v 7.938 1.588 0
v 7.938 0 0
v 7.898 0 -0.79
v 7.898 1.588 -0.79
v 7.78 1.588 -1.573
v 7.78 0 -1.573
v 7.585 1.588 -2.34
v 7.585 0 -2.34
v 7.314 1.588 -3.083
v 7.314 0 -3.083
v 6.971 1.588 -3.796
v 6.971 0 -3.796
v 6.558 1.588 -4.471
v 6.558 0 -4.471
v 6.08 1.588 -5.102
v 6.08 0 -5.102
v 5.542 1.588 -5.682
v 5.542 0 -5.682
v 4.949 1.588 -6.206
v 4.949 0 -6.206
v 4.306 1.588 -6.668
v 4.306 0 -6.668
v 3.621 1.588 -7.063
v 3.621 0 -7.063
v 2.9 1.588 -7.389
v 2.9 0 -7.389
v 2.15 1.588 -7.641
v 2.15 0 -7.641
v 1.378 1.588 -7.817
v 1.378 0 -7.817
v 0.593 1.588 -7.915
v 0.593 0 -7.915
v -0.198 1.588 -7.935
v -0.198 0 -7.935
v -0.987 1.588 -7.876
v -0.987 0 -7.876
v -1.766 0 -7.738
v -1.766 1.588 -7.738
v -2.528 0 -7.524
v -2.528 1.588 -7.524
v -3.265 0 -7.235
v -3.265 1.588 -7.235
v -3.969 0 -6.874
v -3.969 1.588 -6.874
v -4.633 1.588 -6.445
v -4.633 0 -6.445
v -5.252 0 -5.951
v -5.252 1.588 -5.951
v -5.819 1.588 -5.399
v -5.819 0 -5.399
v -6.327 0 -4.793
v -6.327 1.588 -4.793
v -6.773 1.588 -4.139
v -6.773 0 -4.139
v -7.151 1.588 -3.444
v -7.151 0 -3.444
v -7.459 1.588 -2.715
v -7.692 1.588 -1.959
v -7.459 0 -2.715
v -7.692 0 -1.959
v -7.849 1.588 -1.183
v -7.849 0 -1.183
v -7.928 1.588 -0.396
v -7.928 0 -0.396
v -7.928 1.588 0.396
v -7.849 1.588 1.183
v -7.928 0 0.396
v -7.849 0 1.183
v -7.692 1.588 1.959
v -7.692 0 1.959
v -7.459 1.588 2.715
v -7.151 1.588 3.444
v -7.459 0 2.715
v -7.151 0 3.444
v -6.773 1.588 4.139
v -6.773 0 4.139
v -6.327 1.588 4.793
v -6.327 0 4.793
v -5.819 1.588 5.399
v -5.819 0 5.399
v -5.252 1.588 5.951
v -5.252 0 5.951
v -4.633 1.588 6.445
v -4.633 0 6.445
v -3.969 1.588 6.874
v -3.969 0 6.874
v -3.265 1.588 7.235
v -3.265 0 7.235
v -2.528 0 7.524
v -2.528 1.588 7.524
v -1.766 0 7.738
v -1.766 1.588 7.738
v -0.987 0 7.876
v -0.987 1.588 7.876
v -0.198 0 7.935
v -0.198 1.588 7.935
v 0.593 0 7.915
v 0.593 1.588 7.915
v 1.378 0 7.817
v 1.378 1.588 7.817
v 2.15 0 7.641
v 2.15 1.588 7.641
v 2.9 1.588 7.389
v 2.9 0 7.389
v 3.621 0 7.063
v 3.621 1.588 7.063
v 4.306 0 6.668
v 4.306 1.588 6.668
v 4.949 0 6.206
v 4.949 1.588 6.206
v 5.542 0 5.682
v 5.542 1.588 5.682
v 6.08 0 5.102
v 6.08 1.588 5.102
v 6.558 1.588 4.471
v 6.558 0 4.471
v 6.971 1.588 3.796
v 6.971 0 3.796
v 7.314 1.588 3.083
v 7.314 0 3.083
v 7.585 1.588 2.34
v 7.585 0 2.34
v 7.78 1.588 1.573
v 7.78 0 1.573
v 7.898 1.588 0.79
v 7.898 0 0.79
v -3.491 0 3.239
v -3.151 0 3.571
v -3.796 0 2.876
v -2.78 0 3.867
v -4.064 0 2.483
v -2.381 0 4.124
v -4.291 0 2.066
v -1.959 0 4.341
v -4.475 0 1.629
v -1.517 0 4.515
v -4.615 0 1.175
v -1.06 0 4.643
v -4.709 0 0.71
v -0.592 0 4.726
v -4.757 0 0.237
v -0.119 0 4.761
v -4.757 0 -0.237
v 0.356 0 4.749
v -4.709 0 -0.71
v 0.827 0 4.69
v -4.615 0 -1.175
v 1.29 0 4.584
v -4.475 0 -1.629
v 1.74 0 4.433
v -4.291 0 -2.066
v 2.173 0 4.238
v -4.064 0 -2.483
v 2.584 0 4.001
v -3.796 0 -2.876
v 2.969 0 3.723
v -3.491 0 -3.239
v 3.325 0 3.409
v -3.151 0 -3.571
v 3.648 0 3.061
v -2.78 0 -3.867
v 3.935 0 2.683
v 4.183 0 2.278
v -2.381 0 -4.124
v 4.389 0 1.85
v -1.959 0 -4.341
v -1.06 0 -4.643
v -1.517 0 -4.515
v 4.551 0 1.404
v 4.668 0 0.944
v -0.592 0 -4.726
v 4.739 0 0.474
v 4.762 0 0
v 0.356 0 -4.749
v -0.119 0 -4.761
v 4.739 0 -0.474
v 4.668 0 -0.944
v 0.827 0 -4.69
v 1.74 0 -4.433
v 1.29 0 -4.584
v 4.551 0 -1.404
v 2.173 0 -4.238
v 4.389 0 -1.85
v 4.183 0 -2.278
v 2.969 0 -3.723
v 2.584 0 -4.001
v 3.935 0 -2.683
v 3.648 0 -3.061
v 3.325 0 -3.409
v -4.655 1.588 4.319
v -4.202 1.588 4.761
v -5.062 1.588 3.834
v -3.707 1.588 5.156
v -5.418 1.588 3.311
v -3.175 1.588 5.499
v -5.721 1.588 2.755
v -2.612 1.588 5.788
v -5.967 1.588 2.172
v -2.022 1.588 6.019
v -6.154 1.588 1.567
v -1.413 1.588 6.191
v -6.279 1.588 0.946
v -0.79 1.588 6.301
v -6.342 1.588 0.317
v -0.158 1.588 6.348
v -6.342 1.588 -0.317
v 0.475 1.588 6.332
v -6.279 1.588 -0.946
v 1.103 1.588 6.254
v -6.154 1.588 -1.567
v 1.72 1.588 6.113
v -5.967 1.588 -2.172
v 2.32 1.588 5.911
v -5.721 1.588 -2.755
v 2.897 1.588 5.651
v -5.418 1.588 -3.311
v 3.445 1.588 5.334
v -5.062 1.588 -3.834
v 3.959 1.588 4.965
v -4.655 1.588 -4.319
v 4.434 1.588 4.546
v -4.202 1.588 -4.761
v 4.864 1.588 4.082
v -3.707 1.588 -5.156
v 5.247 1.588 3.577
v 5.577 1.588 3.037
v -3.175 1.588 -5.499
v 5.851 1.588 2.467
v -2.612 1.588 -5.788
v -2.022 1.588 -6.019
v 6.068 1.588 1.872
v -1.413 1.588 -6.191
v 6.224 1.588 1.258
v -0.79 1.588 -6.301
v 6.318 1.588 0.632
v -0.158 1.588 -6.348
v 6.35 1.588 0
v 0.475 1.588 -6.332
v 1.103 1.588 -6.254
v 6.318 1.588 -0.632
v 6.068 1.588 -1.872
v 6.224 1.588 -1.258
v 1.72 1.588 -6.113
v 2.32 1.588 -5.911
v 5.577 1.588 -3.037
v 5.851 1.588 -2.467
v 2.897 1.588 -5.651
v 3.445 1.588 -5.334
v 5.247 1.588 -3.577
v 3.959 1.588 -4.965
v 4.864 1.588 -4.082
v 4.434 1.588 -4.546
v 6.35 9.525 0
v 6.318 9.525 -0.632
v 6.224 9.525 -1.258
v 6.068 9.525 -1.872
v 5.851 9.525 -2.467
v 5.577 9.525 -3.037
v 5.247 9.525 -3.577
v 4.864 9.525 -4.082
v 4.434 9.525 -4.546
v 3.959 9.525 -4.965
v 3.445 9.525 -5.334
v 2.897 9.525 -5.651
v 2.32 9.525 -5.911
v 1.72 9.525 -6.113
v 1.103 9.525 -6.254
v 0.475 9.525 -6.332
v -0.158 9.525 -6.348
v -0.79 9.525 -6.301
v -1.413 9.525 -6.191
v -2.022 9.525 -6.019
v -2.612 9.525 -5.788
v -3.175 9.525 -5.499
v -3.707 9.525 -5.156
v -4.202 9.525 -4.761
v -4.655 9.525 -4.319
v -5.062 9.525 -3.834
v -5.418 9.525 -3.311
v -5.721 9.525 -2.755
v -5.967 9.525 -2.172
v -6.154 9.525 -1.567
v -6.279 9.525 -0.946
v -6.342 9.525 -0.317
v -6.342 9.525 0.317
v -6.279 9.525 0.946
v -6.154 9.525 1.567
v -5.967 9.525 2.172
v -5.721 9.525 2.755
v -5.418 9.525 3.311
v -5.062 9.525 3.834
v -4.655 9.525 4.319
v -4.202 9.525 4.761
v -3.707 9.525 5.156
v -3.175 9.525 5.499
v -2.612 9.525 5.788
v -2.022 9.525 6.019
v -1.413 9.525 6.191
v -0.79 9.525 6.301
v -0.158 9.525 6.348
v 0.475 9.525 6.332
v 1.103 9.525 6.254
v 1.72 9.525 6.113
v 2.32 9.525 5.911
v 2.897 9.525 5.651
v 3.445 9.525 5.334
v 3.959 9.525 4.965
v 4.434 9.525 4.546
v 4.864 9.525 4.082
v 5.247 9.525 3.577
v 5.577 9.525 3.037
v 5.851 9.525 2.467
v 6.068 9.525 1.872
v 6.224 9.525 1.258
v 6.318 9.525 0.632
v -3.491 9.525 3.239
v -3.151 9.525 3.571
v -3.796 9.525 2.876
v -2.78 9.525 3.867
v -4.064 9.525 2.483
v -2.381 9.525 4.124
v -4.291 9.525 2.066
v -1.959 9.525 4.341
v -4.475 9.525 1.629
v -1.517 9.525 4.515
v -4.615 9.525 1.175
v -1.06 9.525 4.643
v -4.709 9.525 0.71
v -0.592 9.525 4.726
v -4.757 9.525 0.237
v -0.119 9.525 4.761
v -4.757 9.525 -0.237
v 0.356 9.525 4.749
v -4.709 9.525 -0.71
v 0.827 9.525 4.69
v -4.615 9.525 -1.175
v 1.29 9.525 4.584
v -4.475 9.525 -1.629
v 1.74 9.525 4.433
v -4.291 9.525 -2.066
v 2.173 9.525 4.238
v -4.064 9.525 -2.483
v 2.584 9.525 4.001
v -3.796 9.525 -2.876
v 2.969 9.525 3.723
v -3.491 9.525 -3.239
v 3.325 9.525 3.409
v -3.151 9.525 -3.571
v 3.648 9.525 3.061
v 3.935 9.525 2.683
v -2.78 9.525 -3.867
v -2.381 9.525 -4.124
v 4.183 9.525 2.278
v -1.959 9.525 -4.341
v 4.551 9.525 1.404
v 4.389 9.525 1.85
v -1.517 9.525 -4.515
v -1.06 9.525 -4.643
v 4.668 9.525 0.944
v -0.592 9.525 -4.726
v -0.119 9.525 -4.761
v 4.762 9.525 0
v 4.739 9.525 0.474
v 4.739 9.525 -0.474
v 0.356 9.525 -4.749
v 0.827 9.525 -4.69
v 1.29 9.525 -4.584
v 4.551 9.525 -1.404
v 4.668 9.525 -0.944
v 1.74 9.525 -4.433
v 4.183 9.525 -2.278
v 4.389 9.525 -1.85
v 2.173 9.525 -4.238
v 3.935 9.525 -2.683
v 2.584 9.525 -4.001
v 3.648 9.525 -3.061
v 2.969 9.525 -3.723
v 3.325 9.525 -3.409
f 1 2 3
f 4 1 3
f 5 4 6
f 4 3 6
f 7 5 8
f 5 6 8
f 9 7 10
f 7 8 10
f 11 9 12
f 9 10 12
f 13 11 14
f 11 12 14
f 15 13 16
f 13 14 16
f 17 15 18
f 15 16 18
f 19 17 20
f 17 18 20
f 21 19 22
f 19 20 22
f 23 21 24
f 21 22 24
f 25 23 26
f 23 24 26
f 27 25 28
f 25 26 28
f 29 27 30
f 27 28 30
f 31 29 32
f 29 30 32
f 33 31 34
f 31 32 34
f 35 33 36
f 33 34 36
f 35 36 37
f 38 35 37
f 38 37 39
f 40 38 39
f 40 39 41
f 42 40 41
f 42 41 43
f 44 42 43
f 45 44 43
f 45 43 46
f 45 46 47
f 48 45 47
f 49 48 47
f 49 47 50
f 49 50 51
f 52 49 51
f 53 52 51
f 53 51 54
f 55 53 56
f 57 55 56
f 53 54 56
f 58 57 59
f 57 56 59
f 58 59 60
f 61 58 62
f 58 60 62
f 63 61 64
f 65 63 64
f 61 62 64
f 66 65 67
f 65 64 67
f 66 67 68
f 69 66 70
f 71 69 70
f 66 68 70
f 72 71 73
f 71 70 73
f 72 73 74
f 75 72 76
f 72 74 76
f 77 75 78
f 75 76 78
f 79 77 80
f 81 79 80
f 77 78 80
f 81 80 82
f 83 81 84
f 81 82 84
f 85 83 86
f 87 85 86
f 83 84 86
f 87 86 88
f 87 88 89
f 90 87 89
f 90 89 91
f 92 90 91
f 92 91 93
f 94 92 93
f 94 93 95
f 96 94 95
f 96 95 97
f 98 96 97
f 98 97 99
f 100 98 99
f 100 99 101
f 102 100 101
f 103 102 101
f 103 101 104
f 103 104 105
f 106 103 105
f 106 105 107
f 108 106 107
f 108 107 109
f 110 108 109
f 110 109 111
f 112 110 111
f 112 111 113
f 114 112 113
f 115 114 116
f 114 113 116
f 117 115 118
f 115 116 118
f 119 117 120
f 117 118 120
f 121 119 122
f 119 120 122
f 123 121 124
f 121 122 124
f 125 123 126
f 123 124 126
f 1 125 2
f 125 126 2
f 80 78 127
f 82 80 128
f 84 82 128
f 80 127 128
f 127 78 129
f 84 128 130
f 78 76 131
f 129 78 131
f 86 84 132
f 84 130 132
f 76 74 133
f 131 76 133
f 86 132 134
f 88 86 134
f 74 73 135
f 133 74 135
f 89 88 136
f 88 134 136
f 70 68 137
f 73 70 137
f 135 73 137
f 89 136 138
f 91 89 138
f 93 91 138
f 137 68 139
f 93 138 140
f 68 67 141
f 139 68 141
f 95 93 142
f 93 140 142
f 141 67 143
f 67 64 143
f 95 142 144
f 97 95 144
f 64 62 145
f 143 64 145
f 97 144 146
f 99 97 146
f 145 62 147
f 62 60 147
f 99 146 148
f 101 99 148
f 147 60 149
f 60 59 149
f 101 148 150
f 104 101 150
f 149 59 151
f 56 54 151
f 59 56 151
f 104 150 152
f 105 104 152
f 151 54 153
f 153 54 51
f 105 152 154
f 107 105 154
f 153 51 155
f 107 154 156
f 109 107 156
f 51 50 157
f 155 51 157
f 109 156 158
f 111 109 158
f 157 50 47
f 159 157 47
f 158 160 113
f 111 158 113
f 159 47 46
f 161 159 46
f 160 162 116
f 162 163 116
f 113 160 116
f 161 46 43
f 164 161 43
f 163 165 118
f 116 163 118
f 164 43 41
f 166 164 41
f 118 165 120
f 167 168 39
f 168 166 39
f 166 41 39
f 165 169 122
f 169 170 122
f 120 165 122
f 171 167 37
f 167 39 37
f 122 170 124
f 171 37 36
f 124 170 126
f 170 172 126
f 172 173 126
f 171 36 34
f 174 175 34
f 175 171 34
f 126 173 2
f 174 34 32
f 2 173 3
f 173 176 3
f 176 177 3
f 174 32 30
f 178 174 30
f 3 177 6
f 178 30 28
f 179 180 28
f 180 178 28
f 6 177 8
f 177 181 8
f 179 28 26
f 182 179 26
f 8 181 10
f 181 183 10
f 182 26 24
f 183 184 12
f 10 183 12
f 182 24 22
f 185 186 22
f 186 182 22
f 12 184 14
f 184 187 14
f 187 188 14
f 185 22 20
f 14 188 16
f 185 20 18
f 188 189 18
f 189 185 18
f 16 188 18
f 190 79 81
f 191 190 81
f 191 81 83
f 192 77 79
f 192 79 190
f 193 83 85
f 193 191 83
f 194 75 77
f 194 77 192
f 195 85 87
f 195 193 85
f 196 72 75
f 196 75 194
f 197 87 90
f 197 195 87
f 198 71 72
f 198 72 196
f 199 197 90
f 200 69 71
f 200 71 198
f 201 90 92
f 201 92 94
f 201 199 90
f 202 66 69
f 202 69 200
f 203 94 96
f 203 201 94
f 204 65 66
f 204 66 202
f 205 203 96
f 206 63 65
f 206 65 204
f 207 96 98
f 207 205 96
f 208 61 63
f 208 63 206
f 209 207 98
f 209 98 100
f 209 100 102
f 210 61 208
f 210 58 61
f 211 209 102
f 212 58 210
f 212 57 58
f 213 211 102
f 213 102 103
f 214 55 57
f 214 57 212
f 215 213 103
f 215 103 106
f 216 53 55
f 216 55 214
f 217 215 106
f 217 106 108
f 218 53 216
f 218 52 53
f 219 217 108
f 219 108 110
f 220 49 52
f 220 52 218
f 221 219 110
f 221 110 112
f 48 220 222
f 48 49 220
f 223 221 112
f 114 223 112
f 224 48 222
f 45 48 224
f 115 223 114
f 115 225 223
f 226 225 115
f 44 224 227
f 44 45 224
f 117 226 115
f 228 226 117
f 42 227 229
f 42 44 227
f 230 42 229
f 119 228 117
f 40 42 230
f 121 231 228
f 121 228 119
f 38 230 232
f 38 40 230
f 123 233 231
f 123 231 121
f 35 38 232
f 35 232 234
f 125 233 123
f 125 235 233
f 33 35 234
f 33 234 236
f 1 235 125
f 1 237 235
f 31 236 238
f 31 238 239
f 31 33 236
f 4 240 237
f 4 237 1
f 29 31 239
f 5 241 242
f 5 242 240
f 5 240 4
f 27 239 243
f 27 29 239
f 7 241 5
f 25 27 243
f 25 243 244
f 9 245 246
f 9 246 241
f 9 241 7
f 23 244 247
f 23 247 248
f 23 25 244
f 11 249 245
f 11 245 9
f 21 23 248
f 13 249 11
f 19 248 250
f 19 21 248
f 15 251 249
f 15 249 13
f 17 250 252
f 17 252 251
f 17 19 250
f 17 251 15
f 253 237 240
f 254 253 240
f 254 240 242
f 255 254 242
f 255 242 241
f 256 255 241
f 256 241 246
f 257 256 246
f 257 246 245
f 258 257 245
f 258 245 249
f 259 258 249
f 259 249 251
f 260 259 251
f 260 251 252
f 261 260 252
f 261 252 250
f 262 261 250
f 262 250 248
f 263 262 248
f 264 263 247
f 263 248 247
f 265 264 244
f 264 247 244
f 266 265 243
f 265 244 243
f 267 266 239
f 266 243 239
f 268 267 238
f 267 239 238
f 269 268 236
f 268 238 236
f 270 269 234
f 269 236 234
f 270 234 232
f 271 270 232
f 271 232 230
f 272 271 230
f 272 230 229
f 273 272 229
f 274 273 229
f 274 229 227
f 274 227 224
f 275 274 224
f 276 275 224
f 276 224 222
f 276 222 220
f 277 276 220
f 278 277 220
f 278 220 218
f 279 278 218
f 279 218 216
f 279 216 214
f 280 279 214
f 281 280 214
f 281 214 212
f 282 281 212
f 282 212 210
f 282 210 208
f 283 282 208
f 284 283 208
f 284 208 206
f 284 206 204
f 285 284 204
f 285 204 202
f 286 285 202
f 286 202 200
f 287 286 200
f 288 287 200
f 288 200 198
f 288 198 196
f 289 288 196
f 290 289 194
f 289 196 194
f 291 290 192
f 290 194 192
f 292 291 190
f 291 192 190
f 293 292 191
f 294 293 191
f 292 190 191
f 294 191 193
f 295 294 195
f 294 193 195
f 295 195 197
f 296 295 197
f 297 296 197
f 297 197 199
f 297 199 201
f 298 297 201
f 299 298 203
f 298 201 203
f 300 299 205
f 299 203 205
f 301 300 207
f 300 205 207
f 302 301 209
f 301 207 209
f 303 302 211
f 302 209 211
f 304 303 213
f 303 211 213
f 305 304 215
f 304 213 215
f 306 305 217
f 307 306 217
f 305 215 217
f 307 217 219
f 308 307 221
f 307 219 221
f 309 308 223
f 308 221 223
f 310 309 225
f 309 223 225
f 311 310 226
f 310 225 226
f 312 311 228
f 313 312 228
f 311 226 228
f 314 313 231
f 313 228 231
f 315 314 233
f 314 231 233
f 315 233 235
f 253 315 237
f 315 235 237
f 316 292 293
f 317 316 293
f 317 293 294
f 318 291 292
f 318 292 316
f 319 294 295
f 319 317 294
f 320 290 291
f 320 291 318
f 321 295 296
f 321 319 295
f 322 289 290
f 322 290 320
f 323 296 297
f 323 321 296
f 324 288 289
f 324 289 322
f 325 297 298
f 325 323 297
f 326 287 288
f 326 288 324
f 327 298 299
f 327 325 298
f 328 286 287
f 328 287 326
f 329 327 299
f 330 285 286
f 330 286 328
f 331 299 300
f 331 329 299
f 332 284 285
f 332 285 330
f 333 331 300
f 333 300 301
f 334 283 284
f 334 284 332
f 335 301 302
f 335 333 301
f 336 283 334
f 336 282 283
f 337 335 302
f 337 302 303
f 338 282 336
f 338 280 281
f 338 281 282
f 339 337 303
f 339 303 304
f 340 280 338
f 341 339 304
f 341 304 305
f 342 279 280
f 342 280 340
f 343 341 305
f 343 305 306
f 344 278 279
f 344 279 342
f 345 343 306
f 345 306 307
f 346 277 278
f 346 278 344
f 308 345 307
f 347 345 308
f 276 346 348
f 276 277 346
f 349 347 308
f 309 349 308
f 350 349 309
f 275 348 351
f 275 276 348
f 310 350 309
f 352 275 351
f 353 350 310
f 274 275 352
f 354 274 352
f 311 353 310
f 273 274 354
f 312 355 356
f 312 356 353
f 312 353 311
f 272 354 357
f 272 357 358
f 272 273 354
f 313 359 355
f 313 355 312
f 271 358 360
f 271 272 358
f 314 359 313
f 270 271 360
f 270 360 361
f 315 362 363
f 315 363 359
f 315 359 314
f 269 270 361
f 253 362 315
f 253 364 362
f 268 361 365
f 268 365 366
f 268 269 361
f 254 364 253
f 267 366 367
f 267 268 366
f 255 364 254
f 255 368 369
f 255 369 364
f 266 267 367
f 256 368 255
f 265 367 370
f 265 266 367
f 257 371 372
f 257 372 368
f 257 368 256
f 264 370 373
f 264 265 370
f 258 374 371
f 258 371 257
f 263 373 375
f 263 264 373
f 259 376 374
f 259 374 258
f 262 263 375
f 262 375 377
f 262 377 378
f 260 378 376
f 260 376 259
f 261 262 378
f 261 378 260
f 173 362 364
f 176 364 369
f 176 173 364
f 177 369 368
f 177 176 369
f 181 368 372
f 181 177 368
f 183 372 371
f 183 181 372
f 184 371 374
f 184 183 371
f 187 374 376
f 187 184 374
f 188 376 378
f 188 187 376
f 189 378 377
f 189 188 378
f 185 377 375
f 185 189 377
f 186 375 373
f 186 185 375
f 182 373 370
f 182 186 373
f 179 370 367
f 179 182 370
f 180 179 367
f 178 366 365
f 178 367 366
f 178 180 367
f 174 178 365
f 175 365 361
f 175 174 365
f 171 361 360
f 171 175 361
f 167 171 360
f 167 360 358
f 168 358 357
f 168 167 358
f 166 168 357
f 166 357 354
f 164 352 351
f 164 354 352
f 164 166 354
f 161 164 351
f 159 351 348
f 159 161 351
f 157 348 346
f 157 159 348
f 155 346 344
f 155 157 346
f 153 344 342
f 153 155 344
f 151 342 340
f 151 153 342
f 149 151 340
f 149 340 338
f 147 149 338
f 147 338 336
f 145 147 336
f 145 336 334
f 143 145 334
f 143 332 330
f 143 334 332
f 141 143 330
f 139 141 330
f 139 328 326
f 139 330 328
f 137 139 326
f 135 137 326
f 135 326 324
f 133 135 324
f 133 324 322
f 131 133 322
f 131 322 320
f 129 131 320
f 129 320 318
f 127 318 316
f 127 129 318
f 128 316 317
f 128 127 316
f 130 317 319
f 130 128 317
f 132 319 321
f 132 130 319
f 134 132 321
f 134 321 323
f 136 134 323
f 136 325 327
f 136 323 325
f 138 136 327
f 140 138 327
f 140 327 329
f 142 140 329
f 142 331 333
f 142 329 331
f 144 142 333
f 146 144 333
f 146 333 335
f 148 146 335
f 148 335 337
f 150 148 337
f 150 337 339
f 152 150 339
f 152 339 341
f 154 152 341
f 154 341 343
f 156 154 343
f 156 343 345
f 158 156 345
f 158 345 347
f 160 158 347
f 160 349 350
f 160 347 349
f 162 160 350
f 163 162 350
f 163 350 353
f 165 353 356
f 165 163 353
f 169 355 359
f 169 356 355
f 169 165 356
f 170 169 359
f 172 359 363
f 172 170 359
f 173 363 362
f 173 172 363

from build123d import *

# Parameters (mm, degrees)
TUBE_R              = 6.35
BOSS_EXTRUDE1_DEPTH = 9.525
FLANGE_R            = 7.9375
BOSS_EXTRUDE2_DEPTH = 1.5875
SHAFT_R             = 4.7625
CUT_EXTRUDE1_DEPTH  = 9.5875


with BuildPart() as part:
    # tube → Boss-Extrude1 (new body)
    with BuildSketch(Plane(origin=(0, 0, 0), x_dir=(1, 0, 0), z_dir=(0, 1, 0))):
        Circle(TUBE_R)
    extrude(amount=BOSS_EXTRUDE1_DEPTH)

    # Flange → Boss-Extrude2 (add)
    with BuildSketch(Plane(origin=(0, 0, 0), x_dir=(1, 0, 0), z_dir=(0, 1, 0))):
        Circle(FLANGE_R)
    extrude(amount=BOSS_EXTRUDE2_DEPTH)

    # shaft → Cut-Extrude1 (cut)
    with BuildSketch(Plane(origin=(0, 0, 0), x_dir=(1, 0, 0), z_dir=(0, 1, 0))):
        Circle(SHAFT_R)
    extrude(amount=CUT_EXTRUDE1_DEPTH, mode=Mode.SUBTRACT)


solid = part.part
